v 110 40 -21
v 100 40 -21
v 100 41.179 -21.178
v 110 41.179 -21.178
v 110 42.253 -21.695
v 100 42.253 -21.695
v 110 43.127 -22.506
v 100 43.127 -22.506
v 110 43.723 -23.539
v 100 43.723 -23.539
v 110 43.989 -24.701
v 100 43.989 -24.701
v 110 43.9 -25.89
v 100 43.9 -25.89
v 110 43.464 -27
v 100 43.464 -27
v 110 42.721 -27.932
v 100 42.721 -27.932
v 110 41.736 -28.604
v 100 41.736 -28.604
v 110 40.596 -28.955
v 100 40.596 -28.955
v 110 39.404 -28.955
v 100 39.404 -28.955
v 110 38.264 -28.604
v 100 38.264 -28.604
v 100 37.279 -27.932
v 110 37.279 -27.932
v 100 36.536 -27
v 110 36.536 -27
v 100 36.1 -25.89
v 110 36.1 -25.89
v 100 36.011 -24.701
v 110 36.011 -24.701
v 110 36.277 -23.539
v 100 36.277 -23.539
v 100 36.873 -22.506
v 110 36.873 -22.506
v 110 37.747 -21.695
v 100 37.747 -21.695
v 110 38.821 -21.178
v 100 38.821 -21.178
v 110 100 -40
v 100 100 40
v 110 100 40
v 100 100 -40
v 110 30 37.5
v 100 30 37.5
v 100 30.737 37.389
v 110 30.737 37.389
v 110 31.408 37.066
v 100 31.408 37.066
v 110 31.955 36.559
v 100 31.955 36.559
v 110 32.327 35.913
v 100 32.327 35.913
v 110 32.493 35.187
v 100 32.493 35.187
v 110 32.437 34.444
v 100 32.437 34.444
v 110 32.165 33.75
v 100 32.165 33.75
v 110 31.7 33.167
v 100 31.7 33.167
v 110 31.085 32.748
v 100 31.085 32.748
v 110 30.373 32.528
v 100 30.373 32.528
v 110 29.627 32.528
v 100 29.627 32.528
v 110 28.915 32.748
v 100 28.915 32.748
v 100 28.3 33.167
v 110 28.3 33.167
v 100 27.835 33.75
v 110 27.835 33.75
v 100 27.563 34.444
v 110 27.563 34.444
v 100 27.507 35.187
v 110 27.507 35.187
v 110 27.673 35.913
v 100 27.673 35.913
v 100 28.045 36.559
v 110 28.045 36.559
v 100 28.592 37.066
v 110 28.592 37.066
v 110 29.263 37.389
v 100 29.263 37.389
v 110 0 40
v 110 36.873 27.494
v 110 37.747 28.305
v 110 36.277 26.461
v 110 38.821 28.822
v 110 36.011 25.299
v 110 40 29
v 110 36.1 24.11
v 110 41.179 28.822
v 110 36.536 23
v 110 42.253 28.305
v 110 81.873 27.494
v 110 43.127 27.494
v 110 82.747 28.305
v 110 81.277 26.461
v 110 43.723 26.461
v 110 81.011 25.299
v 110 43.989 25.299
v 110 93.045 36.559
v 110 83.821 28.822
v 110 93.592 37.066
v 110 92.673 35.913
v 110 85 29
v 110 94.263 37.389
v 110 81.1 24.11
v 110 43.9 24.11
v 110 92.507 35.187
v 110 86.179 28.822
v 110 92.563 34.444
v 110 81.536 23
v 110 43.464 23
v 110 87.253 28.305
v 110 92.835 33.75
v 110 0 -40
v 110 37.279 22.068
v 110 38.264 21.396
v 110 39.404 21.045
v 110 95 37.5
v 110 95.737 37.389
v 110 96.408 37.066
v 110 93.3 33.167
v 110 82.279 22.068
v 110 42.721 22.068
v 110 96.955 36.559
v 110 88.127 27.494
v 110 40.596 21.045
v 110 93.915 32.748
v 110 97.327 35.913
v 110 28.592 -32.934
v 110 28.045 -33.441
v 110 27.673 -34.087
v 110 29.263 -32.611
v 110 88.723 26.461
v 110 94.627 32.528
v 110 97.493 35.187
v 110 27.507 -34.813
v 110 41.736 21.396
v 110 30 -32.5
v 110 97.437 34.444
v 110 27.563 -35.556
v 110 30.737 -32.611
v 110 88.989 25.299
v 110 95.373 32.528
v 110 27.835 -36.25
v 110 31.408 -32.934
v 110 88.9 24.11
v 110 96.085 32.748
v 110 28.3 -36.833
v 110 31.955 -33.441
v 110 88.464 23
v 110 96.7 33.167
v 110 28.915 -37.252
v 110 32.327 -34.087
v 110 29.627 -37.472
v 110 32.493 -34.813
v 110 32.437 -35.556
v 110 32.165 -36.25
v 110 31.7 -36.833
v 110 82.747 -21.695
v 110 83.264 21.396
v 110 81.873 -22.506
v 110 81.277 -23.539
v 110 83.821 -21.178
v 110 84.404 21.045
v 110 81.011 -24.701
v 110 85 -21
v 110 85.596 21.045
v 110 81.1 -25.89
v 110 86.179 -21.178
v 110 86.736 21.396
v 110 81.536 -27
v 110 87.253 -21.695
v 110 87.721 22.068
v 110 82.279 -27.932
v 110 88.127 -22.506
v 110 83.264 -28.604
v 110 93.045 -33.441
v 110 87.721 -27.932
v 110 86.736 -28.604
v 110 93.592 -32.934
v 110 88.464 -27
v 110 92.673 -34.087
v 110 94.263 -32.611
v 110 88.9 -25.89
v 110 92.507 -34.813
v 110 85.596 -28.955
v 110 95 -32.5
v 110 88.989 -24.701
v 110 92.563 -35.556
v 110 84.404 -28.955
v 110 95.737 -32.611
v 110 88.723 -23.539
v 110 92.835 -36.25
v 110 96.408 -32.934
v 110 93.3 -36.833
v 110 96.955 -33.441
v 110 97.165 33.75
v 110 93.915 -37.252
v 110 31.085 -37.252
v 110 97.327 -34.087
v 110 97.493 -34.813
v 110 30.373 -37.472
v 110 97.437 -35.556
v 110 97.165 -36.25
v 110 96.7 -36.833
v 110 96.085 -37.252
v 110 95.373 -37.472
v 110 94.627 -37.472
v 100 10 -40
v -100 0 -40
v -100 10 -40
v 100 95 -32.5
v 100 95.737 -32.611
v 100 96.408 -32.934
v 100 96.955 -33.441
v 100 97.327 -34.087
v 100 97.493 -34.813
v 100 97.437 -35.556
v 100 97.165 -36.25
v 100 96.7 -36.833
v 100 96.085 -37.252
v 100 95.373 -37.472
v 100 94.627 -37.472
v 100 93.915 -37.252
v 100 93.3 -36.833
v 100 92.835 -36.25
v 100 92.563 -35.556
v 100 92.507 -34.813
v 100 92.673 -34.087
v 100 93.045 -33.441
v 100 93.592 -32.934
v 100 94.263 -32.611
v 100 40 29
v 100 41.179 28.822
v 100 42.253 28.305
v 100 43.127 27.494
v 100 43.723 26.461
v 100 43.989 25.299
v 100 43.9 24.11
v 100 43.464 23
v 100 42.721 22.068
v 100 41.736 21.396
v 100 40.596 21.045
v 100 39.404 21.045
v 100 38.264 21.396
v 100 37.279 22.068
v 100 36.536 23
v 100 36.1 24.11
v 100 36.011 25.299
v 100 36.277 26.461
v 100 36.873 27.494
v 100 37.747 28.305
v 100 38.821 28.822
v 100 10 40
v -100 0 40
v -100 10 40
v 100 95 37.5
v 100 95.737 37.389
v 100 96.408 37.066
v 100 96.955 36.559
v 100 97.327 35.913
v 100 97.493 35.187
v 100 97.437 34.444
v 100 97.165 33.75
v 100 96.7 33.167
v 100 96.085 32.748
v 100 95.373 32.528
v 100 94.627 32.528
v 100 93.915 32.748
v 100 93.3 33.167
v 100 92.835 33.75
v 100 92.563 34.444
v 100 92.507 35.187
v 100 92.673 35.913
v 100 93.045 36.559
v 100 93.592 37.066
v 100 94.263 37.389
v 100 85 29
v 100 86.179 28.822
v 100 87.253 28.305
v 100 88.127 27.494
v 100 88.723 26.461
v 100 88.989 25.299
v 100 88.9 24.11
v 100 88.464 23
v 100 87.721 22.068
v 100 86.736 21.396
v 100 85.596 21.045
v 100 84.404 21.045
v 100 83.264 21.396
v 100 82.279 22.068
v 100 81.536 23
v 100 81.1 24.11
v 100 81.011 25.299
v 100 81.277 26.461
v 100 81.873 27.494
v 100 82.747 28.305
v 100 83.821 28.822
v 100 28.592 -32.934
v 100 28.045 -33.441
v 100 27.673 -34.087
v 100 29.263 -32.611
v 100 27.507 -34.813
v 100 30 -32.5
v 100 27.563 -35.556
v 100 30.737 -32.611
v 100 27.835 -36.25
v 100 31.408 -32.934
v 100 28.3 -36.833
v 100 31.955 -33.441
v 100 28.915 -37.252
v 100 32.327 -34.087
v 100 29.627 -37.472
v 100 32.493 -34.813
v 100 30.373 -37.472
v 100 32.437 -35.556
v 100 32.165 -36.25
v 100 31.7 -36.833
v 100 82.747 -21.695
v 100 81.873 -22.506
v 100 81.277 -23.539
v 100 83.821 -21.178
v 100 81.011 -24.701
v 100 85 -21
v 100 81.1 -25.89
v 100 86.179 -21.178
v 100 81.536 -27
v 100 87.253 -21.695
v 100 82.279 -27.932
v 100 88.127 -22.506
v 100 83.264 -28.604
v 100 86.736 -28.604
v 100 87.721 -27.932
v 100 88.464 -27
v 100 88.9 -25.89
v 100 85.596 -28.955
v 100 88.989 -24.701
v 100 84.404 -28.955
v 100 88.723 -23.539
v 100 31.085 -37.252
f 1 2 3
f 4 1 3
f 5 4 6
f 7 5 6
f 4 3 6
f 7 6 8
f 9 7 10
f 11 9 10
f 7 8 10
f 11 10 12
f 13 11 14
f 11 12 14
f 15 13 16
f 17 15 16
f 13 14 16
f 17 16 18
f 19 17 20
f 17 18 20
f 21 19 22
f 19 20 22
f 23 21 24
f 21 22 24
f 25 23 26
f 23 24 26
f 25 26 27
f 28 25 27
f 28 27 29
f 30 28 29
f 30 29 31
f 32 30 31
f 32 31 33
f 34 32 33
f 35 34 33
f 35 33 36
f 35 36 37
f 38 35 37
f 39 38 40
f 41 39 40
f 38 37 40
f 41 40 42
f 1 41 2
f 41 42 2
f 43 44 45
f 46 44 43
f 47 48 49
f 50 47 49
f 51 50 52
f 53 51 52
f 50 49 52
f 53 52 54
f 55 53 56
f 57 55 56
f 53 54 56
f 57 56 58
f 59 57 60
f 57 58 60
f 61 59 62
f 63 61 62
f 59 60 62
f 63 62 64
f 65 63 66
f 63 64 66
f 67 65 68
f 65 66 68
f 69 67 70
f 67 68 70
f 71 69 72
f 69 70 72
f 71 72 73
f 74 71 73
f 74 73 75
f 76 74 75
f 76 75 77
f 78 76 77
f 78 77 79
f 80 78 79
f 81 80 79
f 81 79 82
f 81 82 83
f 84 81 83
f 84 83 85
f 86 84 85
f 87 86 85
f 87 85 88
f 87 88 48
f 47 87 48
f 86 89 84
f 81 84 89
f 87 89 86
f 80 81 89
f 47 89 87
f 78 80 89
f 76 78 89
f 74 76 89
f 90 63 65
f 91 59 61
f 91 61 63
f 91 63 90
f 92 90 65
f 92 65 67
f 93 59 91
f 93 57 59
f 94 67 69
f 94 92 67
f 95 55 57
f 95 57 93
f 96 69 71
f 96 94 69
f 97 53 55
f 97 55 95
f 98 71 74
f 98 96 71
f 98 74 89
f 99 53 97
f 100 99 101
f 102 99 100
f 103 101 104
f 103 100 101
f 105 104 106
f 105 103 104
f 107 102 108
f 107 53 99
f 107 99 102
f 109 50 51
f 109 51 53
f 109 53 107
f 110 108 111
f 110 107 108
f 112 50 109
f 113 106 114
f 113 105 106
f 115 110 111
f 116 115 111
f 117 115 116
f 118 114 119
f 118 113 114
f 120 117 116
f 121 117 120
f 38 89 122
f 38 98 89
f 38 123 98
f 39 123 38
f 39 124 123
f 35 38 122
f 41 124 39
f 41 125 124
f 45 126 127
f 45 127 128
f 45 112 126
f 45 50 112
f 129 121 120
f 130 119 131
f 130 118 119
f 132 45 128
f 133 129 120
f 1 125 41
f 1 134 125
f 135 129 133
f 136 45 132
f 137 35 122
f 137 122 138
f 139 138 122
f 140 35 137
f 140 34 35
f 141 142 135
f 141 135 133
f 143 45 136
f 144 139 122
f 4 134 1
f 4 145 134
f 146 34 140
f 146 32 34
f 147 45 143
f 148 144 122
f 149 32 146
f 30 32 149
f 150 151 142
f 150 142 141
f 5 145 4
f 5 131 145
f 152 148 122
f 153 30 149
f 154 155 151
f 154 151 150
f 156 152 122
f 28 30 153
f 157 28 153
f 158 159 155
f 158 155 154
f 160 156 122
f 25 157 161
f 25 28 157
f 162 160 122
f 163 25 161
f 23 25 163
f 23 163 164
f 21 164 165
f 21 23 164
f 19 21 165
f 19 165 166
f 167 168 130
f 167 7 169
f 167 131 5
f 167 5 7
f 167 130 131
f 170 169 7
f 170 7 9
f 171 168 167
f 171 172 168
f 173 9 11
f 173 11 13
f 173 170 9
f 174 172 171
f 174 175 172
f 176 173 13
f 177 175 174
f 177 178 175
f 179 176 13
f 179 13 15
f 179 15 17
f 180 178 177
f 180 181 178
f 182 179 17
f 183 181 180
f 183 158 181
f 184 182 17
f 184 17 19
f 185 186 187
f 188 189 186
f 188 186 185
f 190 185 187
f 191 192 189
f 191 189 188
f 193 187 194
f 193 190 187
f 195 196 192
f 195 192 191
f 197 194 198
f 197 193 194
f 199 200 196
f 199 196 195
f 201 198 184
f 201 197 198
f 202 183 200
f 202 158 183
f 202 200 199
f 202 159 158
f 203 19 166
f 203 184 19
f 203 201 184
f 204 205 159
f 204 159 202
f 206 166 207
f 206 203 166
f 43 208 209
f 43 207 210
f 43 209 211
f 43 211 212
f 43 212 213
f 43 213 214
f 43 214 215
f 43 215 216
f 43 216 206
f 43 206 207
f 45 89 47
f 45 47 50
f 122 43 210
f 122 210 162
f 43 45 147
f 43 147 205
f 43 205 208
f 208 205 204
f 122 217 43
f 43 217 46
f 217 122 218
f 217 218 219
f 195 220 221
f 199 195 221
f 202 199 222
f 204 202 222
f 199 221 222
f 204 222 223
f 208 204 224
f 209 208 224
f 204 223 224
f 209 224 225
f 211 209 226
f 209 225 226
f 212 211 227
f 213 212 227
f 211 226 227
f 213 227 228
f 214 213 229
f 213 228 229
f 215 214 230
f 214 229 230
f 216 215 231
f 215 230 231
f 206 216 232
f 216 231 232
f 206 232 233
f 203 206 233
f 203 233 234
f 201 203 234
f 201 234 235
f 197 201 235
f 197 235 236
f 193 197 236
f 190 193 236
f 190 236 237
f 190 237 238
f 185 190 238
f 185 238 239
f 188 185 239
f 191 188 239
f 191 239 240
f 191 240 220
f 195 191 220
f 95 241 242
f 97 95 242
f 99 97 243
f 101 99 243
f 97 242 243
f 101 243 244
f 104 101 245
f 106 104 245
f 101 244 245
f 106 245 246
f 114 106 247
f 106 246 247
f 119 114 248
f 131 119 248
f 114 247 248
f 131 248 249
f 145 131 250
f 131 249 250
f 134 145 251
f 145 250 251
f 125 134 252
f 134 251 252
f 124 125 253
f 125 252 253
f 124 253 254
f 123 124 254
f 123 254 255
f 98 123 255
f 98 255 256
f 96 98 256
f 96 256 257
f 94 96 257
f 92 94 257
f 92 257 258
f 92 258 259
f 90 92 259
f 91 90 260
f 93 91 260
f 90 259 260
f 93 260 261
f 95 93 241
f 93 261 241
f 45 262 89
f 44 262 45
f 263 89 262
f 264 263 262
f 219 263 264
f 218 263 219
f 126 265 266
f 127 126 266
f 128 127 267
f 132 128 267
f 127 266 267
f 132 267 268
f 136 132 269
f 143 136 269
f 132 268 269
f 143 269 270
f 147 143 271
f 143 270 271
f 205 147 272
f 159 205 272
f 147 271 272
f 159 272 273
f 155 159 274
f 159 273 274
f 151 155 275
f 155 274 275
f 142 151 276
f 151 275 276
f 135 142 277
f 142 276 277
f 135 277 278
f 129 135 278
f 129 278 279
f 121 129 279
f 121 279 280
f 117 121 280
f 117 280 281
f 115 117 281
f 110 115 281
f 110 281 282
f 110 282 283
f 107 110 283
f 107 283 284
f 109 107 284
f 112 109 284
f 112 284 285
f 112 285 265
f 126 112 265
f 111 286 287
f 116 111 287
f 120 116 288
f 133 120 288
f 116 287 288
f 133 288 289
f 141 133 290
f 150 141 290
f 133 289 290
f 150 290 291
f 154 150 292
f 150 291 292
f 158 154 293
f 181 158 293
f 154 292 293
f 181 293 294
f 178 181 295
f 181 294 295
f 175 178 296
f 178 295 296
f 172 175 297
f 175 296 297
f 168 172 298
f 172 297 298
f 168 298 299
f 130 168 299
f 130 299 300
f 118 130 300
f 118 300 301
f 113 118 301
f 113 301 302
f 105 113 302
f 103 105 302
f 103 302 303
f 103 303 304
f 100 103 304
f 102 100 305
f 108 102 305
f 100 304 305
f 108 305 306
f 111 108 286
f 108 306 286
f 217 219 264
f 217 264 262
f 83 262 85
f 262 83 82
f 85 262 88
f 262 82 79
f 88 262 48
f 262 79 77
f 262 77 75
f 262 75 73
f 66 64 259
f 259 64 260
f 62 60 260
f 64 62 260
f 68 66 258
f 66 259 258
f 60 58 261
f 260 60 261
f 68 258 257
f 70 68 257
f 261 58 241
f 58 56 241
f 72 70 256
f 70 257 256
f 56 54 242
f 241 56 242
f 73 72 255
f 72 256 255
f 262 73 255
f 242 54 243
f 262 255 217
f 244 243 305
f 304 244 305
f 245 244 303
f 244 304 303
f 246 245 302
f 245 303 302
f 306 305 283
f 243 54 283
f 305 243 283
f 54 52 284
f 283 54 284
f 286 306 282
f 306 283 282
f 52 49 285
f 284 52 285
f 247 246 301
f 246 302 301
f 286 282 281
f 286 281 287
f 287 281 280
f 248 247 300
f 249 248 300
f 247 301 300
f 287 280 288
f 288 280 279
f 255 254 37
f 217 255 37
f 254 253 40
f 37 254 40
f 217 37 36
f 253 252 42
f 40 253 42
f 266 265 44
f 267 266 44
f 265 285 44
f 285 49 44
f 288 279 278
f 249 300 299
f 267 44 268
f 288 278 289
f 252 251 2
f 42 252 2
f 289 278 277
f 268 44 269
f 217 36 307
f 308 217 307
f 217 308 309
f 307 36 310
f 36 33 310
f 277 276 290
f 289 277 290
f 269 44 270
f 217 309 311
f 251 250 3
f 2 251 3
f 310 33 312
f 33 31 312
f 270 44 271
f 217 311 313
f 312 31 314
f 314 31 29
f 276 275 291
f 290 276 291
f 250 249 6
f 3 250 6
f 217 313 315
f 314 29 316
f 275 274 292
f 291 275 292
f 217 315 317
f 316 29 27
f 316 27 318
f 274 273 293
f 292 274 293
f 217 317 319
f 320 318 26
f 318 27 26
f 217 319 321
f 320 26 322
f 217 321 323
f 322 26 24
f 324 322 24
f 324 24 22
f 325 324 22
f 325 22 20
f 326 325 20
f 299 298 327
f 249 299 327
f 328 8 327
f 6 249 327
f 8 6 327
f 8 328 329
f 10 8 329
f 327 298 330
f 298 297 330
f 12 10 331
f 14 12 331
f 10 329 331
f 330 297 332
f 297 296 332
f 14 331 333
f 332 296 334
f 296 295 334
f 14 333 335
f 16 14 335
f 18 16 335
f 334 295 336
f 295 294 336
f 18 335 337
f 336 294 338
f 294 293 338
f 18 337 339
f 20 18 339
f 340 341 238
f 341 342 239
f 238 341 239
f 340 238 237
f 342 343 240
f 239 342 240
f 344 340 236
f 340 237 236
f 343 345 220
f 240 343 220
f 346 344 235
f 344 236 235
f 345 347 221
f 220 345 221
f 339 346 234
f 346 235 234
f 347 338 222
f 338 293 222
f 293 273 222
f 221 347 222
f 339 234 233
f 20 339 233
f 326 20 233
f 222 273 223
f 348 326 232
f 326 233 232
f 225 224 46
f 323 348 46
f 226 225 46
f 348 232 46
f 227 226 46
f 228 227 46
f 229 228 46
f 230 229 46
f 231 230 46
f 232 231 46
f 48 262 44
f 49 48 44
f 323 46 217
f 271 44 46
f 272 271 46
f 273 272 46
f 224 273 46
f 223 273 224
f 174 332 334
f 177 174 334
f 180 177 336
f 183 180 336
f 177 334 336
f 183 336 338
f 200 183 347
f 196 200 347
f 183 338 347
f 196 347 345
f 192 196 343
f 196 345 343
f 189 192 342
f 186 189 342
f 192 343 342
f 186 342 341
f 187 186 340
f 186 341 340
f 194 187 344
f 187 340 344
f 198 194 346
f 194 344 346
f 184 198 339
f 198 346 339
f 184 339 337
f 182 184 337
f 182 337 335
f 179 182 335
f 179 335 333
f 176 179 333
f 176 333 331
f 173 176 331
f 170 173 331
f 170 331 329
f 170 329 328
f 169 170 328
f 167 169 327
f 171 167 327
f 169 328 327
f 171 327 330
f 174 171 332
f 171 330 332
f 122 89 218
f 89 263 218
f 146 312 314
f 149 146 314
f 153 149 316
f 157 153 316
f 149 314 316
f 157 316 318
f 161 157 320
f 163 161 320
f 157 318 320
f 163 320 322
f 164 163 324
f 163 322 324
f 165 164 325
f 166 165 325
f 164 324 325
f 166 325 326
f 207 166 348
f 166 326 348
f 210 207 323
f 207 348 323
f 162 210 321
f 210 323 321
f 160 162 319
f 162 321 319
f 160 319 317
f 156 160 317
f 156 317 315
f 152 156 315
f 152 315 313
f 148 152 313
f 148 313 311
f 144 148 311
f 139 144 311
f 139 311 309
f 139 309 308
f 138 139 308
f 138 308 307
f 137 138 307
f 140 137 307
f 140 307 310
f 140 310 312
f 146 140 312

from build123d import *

# Parameters (mm, degrees)
SKETCH2_W           = 200
SKETCH2_H           = 80
BOSS_EXTRUDE1_DEPTH = 10
SKETCH3_W           = 80
SKETCH3_H           = 100
BOSS_EXTRUDE2_DEPTH = 10
SKETCH6_R           = 4
CUT_EXTRUDE2_DEPTH  = 10
SKETCH8_R           = 2.5
CUT_EXTRUDE3_DEPTH  = 100


with BuildPart() as part:
    # Sketch2 → Boss-Extrude1 (new body)
    with BuildSketch(Plane(origin=(0, 0, 0), x_dir=(1, 0, 0), z_dir=(0, 1, 0))):
        Rectangle(SKETCH2_W, SKETCH2_H)
    extrude(amount=BOSS_EXTRUDE1_DEPTH)

    # Sketch3 → Boss-Extrude2 (add)
    with BuildSketch(Plane(origin=(100, 0, 0), x_dir=(0, 0, -1), z_dir=(1, 0, 0))):
        with Locations((0, 50)):
            Rectangle(SKETCH3_W, SKETCH3_H)
    extrude(amount=BOSS_EXTRUDE2_DEPTH)

    # Sketch6 → Cut-Extrude2 (cut)
    with BuildSketch(Plane.ZY.offset(-100)):
        with Locations((-25, 85)):
            Circle(SKETCH6_R)
        with Locations((25, 85)):
            Circle(SKETCH6_R)
        with Locations((-25, 40)):
            Circle(SKETCH6_R)
        with Locations((25, 40)):
            Circle(SKETCH6_R)
    extrude(amount=-CUT_EXTRUDE2_DEPTH, mode=Mode.SUBTRACT)

    # Sketch8 → Cut-Extrude3 (cut)
    with BuildSketch(Plane.ZY.offset(-100)):
        with Locations((-35, 95)):
            Circle(SKETCH8_R)
        with Locations((35, 95)):
            Circle(SKETCH8_R)
        with Locations((-35, 30)):
            Circle(SKETCH8_R)
        with Locations((35, 30)):
            Circle(SKETCH8_R)
    extrude(amount=-CUT_EXTRUDE3_DEPTH, mode=Mode.SUBTRACT)


solid = part.part
